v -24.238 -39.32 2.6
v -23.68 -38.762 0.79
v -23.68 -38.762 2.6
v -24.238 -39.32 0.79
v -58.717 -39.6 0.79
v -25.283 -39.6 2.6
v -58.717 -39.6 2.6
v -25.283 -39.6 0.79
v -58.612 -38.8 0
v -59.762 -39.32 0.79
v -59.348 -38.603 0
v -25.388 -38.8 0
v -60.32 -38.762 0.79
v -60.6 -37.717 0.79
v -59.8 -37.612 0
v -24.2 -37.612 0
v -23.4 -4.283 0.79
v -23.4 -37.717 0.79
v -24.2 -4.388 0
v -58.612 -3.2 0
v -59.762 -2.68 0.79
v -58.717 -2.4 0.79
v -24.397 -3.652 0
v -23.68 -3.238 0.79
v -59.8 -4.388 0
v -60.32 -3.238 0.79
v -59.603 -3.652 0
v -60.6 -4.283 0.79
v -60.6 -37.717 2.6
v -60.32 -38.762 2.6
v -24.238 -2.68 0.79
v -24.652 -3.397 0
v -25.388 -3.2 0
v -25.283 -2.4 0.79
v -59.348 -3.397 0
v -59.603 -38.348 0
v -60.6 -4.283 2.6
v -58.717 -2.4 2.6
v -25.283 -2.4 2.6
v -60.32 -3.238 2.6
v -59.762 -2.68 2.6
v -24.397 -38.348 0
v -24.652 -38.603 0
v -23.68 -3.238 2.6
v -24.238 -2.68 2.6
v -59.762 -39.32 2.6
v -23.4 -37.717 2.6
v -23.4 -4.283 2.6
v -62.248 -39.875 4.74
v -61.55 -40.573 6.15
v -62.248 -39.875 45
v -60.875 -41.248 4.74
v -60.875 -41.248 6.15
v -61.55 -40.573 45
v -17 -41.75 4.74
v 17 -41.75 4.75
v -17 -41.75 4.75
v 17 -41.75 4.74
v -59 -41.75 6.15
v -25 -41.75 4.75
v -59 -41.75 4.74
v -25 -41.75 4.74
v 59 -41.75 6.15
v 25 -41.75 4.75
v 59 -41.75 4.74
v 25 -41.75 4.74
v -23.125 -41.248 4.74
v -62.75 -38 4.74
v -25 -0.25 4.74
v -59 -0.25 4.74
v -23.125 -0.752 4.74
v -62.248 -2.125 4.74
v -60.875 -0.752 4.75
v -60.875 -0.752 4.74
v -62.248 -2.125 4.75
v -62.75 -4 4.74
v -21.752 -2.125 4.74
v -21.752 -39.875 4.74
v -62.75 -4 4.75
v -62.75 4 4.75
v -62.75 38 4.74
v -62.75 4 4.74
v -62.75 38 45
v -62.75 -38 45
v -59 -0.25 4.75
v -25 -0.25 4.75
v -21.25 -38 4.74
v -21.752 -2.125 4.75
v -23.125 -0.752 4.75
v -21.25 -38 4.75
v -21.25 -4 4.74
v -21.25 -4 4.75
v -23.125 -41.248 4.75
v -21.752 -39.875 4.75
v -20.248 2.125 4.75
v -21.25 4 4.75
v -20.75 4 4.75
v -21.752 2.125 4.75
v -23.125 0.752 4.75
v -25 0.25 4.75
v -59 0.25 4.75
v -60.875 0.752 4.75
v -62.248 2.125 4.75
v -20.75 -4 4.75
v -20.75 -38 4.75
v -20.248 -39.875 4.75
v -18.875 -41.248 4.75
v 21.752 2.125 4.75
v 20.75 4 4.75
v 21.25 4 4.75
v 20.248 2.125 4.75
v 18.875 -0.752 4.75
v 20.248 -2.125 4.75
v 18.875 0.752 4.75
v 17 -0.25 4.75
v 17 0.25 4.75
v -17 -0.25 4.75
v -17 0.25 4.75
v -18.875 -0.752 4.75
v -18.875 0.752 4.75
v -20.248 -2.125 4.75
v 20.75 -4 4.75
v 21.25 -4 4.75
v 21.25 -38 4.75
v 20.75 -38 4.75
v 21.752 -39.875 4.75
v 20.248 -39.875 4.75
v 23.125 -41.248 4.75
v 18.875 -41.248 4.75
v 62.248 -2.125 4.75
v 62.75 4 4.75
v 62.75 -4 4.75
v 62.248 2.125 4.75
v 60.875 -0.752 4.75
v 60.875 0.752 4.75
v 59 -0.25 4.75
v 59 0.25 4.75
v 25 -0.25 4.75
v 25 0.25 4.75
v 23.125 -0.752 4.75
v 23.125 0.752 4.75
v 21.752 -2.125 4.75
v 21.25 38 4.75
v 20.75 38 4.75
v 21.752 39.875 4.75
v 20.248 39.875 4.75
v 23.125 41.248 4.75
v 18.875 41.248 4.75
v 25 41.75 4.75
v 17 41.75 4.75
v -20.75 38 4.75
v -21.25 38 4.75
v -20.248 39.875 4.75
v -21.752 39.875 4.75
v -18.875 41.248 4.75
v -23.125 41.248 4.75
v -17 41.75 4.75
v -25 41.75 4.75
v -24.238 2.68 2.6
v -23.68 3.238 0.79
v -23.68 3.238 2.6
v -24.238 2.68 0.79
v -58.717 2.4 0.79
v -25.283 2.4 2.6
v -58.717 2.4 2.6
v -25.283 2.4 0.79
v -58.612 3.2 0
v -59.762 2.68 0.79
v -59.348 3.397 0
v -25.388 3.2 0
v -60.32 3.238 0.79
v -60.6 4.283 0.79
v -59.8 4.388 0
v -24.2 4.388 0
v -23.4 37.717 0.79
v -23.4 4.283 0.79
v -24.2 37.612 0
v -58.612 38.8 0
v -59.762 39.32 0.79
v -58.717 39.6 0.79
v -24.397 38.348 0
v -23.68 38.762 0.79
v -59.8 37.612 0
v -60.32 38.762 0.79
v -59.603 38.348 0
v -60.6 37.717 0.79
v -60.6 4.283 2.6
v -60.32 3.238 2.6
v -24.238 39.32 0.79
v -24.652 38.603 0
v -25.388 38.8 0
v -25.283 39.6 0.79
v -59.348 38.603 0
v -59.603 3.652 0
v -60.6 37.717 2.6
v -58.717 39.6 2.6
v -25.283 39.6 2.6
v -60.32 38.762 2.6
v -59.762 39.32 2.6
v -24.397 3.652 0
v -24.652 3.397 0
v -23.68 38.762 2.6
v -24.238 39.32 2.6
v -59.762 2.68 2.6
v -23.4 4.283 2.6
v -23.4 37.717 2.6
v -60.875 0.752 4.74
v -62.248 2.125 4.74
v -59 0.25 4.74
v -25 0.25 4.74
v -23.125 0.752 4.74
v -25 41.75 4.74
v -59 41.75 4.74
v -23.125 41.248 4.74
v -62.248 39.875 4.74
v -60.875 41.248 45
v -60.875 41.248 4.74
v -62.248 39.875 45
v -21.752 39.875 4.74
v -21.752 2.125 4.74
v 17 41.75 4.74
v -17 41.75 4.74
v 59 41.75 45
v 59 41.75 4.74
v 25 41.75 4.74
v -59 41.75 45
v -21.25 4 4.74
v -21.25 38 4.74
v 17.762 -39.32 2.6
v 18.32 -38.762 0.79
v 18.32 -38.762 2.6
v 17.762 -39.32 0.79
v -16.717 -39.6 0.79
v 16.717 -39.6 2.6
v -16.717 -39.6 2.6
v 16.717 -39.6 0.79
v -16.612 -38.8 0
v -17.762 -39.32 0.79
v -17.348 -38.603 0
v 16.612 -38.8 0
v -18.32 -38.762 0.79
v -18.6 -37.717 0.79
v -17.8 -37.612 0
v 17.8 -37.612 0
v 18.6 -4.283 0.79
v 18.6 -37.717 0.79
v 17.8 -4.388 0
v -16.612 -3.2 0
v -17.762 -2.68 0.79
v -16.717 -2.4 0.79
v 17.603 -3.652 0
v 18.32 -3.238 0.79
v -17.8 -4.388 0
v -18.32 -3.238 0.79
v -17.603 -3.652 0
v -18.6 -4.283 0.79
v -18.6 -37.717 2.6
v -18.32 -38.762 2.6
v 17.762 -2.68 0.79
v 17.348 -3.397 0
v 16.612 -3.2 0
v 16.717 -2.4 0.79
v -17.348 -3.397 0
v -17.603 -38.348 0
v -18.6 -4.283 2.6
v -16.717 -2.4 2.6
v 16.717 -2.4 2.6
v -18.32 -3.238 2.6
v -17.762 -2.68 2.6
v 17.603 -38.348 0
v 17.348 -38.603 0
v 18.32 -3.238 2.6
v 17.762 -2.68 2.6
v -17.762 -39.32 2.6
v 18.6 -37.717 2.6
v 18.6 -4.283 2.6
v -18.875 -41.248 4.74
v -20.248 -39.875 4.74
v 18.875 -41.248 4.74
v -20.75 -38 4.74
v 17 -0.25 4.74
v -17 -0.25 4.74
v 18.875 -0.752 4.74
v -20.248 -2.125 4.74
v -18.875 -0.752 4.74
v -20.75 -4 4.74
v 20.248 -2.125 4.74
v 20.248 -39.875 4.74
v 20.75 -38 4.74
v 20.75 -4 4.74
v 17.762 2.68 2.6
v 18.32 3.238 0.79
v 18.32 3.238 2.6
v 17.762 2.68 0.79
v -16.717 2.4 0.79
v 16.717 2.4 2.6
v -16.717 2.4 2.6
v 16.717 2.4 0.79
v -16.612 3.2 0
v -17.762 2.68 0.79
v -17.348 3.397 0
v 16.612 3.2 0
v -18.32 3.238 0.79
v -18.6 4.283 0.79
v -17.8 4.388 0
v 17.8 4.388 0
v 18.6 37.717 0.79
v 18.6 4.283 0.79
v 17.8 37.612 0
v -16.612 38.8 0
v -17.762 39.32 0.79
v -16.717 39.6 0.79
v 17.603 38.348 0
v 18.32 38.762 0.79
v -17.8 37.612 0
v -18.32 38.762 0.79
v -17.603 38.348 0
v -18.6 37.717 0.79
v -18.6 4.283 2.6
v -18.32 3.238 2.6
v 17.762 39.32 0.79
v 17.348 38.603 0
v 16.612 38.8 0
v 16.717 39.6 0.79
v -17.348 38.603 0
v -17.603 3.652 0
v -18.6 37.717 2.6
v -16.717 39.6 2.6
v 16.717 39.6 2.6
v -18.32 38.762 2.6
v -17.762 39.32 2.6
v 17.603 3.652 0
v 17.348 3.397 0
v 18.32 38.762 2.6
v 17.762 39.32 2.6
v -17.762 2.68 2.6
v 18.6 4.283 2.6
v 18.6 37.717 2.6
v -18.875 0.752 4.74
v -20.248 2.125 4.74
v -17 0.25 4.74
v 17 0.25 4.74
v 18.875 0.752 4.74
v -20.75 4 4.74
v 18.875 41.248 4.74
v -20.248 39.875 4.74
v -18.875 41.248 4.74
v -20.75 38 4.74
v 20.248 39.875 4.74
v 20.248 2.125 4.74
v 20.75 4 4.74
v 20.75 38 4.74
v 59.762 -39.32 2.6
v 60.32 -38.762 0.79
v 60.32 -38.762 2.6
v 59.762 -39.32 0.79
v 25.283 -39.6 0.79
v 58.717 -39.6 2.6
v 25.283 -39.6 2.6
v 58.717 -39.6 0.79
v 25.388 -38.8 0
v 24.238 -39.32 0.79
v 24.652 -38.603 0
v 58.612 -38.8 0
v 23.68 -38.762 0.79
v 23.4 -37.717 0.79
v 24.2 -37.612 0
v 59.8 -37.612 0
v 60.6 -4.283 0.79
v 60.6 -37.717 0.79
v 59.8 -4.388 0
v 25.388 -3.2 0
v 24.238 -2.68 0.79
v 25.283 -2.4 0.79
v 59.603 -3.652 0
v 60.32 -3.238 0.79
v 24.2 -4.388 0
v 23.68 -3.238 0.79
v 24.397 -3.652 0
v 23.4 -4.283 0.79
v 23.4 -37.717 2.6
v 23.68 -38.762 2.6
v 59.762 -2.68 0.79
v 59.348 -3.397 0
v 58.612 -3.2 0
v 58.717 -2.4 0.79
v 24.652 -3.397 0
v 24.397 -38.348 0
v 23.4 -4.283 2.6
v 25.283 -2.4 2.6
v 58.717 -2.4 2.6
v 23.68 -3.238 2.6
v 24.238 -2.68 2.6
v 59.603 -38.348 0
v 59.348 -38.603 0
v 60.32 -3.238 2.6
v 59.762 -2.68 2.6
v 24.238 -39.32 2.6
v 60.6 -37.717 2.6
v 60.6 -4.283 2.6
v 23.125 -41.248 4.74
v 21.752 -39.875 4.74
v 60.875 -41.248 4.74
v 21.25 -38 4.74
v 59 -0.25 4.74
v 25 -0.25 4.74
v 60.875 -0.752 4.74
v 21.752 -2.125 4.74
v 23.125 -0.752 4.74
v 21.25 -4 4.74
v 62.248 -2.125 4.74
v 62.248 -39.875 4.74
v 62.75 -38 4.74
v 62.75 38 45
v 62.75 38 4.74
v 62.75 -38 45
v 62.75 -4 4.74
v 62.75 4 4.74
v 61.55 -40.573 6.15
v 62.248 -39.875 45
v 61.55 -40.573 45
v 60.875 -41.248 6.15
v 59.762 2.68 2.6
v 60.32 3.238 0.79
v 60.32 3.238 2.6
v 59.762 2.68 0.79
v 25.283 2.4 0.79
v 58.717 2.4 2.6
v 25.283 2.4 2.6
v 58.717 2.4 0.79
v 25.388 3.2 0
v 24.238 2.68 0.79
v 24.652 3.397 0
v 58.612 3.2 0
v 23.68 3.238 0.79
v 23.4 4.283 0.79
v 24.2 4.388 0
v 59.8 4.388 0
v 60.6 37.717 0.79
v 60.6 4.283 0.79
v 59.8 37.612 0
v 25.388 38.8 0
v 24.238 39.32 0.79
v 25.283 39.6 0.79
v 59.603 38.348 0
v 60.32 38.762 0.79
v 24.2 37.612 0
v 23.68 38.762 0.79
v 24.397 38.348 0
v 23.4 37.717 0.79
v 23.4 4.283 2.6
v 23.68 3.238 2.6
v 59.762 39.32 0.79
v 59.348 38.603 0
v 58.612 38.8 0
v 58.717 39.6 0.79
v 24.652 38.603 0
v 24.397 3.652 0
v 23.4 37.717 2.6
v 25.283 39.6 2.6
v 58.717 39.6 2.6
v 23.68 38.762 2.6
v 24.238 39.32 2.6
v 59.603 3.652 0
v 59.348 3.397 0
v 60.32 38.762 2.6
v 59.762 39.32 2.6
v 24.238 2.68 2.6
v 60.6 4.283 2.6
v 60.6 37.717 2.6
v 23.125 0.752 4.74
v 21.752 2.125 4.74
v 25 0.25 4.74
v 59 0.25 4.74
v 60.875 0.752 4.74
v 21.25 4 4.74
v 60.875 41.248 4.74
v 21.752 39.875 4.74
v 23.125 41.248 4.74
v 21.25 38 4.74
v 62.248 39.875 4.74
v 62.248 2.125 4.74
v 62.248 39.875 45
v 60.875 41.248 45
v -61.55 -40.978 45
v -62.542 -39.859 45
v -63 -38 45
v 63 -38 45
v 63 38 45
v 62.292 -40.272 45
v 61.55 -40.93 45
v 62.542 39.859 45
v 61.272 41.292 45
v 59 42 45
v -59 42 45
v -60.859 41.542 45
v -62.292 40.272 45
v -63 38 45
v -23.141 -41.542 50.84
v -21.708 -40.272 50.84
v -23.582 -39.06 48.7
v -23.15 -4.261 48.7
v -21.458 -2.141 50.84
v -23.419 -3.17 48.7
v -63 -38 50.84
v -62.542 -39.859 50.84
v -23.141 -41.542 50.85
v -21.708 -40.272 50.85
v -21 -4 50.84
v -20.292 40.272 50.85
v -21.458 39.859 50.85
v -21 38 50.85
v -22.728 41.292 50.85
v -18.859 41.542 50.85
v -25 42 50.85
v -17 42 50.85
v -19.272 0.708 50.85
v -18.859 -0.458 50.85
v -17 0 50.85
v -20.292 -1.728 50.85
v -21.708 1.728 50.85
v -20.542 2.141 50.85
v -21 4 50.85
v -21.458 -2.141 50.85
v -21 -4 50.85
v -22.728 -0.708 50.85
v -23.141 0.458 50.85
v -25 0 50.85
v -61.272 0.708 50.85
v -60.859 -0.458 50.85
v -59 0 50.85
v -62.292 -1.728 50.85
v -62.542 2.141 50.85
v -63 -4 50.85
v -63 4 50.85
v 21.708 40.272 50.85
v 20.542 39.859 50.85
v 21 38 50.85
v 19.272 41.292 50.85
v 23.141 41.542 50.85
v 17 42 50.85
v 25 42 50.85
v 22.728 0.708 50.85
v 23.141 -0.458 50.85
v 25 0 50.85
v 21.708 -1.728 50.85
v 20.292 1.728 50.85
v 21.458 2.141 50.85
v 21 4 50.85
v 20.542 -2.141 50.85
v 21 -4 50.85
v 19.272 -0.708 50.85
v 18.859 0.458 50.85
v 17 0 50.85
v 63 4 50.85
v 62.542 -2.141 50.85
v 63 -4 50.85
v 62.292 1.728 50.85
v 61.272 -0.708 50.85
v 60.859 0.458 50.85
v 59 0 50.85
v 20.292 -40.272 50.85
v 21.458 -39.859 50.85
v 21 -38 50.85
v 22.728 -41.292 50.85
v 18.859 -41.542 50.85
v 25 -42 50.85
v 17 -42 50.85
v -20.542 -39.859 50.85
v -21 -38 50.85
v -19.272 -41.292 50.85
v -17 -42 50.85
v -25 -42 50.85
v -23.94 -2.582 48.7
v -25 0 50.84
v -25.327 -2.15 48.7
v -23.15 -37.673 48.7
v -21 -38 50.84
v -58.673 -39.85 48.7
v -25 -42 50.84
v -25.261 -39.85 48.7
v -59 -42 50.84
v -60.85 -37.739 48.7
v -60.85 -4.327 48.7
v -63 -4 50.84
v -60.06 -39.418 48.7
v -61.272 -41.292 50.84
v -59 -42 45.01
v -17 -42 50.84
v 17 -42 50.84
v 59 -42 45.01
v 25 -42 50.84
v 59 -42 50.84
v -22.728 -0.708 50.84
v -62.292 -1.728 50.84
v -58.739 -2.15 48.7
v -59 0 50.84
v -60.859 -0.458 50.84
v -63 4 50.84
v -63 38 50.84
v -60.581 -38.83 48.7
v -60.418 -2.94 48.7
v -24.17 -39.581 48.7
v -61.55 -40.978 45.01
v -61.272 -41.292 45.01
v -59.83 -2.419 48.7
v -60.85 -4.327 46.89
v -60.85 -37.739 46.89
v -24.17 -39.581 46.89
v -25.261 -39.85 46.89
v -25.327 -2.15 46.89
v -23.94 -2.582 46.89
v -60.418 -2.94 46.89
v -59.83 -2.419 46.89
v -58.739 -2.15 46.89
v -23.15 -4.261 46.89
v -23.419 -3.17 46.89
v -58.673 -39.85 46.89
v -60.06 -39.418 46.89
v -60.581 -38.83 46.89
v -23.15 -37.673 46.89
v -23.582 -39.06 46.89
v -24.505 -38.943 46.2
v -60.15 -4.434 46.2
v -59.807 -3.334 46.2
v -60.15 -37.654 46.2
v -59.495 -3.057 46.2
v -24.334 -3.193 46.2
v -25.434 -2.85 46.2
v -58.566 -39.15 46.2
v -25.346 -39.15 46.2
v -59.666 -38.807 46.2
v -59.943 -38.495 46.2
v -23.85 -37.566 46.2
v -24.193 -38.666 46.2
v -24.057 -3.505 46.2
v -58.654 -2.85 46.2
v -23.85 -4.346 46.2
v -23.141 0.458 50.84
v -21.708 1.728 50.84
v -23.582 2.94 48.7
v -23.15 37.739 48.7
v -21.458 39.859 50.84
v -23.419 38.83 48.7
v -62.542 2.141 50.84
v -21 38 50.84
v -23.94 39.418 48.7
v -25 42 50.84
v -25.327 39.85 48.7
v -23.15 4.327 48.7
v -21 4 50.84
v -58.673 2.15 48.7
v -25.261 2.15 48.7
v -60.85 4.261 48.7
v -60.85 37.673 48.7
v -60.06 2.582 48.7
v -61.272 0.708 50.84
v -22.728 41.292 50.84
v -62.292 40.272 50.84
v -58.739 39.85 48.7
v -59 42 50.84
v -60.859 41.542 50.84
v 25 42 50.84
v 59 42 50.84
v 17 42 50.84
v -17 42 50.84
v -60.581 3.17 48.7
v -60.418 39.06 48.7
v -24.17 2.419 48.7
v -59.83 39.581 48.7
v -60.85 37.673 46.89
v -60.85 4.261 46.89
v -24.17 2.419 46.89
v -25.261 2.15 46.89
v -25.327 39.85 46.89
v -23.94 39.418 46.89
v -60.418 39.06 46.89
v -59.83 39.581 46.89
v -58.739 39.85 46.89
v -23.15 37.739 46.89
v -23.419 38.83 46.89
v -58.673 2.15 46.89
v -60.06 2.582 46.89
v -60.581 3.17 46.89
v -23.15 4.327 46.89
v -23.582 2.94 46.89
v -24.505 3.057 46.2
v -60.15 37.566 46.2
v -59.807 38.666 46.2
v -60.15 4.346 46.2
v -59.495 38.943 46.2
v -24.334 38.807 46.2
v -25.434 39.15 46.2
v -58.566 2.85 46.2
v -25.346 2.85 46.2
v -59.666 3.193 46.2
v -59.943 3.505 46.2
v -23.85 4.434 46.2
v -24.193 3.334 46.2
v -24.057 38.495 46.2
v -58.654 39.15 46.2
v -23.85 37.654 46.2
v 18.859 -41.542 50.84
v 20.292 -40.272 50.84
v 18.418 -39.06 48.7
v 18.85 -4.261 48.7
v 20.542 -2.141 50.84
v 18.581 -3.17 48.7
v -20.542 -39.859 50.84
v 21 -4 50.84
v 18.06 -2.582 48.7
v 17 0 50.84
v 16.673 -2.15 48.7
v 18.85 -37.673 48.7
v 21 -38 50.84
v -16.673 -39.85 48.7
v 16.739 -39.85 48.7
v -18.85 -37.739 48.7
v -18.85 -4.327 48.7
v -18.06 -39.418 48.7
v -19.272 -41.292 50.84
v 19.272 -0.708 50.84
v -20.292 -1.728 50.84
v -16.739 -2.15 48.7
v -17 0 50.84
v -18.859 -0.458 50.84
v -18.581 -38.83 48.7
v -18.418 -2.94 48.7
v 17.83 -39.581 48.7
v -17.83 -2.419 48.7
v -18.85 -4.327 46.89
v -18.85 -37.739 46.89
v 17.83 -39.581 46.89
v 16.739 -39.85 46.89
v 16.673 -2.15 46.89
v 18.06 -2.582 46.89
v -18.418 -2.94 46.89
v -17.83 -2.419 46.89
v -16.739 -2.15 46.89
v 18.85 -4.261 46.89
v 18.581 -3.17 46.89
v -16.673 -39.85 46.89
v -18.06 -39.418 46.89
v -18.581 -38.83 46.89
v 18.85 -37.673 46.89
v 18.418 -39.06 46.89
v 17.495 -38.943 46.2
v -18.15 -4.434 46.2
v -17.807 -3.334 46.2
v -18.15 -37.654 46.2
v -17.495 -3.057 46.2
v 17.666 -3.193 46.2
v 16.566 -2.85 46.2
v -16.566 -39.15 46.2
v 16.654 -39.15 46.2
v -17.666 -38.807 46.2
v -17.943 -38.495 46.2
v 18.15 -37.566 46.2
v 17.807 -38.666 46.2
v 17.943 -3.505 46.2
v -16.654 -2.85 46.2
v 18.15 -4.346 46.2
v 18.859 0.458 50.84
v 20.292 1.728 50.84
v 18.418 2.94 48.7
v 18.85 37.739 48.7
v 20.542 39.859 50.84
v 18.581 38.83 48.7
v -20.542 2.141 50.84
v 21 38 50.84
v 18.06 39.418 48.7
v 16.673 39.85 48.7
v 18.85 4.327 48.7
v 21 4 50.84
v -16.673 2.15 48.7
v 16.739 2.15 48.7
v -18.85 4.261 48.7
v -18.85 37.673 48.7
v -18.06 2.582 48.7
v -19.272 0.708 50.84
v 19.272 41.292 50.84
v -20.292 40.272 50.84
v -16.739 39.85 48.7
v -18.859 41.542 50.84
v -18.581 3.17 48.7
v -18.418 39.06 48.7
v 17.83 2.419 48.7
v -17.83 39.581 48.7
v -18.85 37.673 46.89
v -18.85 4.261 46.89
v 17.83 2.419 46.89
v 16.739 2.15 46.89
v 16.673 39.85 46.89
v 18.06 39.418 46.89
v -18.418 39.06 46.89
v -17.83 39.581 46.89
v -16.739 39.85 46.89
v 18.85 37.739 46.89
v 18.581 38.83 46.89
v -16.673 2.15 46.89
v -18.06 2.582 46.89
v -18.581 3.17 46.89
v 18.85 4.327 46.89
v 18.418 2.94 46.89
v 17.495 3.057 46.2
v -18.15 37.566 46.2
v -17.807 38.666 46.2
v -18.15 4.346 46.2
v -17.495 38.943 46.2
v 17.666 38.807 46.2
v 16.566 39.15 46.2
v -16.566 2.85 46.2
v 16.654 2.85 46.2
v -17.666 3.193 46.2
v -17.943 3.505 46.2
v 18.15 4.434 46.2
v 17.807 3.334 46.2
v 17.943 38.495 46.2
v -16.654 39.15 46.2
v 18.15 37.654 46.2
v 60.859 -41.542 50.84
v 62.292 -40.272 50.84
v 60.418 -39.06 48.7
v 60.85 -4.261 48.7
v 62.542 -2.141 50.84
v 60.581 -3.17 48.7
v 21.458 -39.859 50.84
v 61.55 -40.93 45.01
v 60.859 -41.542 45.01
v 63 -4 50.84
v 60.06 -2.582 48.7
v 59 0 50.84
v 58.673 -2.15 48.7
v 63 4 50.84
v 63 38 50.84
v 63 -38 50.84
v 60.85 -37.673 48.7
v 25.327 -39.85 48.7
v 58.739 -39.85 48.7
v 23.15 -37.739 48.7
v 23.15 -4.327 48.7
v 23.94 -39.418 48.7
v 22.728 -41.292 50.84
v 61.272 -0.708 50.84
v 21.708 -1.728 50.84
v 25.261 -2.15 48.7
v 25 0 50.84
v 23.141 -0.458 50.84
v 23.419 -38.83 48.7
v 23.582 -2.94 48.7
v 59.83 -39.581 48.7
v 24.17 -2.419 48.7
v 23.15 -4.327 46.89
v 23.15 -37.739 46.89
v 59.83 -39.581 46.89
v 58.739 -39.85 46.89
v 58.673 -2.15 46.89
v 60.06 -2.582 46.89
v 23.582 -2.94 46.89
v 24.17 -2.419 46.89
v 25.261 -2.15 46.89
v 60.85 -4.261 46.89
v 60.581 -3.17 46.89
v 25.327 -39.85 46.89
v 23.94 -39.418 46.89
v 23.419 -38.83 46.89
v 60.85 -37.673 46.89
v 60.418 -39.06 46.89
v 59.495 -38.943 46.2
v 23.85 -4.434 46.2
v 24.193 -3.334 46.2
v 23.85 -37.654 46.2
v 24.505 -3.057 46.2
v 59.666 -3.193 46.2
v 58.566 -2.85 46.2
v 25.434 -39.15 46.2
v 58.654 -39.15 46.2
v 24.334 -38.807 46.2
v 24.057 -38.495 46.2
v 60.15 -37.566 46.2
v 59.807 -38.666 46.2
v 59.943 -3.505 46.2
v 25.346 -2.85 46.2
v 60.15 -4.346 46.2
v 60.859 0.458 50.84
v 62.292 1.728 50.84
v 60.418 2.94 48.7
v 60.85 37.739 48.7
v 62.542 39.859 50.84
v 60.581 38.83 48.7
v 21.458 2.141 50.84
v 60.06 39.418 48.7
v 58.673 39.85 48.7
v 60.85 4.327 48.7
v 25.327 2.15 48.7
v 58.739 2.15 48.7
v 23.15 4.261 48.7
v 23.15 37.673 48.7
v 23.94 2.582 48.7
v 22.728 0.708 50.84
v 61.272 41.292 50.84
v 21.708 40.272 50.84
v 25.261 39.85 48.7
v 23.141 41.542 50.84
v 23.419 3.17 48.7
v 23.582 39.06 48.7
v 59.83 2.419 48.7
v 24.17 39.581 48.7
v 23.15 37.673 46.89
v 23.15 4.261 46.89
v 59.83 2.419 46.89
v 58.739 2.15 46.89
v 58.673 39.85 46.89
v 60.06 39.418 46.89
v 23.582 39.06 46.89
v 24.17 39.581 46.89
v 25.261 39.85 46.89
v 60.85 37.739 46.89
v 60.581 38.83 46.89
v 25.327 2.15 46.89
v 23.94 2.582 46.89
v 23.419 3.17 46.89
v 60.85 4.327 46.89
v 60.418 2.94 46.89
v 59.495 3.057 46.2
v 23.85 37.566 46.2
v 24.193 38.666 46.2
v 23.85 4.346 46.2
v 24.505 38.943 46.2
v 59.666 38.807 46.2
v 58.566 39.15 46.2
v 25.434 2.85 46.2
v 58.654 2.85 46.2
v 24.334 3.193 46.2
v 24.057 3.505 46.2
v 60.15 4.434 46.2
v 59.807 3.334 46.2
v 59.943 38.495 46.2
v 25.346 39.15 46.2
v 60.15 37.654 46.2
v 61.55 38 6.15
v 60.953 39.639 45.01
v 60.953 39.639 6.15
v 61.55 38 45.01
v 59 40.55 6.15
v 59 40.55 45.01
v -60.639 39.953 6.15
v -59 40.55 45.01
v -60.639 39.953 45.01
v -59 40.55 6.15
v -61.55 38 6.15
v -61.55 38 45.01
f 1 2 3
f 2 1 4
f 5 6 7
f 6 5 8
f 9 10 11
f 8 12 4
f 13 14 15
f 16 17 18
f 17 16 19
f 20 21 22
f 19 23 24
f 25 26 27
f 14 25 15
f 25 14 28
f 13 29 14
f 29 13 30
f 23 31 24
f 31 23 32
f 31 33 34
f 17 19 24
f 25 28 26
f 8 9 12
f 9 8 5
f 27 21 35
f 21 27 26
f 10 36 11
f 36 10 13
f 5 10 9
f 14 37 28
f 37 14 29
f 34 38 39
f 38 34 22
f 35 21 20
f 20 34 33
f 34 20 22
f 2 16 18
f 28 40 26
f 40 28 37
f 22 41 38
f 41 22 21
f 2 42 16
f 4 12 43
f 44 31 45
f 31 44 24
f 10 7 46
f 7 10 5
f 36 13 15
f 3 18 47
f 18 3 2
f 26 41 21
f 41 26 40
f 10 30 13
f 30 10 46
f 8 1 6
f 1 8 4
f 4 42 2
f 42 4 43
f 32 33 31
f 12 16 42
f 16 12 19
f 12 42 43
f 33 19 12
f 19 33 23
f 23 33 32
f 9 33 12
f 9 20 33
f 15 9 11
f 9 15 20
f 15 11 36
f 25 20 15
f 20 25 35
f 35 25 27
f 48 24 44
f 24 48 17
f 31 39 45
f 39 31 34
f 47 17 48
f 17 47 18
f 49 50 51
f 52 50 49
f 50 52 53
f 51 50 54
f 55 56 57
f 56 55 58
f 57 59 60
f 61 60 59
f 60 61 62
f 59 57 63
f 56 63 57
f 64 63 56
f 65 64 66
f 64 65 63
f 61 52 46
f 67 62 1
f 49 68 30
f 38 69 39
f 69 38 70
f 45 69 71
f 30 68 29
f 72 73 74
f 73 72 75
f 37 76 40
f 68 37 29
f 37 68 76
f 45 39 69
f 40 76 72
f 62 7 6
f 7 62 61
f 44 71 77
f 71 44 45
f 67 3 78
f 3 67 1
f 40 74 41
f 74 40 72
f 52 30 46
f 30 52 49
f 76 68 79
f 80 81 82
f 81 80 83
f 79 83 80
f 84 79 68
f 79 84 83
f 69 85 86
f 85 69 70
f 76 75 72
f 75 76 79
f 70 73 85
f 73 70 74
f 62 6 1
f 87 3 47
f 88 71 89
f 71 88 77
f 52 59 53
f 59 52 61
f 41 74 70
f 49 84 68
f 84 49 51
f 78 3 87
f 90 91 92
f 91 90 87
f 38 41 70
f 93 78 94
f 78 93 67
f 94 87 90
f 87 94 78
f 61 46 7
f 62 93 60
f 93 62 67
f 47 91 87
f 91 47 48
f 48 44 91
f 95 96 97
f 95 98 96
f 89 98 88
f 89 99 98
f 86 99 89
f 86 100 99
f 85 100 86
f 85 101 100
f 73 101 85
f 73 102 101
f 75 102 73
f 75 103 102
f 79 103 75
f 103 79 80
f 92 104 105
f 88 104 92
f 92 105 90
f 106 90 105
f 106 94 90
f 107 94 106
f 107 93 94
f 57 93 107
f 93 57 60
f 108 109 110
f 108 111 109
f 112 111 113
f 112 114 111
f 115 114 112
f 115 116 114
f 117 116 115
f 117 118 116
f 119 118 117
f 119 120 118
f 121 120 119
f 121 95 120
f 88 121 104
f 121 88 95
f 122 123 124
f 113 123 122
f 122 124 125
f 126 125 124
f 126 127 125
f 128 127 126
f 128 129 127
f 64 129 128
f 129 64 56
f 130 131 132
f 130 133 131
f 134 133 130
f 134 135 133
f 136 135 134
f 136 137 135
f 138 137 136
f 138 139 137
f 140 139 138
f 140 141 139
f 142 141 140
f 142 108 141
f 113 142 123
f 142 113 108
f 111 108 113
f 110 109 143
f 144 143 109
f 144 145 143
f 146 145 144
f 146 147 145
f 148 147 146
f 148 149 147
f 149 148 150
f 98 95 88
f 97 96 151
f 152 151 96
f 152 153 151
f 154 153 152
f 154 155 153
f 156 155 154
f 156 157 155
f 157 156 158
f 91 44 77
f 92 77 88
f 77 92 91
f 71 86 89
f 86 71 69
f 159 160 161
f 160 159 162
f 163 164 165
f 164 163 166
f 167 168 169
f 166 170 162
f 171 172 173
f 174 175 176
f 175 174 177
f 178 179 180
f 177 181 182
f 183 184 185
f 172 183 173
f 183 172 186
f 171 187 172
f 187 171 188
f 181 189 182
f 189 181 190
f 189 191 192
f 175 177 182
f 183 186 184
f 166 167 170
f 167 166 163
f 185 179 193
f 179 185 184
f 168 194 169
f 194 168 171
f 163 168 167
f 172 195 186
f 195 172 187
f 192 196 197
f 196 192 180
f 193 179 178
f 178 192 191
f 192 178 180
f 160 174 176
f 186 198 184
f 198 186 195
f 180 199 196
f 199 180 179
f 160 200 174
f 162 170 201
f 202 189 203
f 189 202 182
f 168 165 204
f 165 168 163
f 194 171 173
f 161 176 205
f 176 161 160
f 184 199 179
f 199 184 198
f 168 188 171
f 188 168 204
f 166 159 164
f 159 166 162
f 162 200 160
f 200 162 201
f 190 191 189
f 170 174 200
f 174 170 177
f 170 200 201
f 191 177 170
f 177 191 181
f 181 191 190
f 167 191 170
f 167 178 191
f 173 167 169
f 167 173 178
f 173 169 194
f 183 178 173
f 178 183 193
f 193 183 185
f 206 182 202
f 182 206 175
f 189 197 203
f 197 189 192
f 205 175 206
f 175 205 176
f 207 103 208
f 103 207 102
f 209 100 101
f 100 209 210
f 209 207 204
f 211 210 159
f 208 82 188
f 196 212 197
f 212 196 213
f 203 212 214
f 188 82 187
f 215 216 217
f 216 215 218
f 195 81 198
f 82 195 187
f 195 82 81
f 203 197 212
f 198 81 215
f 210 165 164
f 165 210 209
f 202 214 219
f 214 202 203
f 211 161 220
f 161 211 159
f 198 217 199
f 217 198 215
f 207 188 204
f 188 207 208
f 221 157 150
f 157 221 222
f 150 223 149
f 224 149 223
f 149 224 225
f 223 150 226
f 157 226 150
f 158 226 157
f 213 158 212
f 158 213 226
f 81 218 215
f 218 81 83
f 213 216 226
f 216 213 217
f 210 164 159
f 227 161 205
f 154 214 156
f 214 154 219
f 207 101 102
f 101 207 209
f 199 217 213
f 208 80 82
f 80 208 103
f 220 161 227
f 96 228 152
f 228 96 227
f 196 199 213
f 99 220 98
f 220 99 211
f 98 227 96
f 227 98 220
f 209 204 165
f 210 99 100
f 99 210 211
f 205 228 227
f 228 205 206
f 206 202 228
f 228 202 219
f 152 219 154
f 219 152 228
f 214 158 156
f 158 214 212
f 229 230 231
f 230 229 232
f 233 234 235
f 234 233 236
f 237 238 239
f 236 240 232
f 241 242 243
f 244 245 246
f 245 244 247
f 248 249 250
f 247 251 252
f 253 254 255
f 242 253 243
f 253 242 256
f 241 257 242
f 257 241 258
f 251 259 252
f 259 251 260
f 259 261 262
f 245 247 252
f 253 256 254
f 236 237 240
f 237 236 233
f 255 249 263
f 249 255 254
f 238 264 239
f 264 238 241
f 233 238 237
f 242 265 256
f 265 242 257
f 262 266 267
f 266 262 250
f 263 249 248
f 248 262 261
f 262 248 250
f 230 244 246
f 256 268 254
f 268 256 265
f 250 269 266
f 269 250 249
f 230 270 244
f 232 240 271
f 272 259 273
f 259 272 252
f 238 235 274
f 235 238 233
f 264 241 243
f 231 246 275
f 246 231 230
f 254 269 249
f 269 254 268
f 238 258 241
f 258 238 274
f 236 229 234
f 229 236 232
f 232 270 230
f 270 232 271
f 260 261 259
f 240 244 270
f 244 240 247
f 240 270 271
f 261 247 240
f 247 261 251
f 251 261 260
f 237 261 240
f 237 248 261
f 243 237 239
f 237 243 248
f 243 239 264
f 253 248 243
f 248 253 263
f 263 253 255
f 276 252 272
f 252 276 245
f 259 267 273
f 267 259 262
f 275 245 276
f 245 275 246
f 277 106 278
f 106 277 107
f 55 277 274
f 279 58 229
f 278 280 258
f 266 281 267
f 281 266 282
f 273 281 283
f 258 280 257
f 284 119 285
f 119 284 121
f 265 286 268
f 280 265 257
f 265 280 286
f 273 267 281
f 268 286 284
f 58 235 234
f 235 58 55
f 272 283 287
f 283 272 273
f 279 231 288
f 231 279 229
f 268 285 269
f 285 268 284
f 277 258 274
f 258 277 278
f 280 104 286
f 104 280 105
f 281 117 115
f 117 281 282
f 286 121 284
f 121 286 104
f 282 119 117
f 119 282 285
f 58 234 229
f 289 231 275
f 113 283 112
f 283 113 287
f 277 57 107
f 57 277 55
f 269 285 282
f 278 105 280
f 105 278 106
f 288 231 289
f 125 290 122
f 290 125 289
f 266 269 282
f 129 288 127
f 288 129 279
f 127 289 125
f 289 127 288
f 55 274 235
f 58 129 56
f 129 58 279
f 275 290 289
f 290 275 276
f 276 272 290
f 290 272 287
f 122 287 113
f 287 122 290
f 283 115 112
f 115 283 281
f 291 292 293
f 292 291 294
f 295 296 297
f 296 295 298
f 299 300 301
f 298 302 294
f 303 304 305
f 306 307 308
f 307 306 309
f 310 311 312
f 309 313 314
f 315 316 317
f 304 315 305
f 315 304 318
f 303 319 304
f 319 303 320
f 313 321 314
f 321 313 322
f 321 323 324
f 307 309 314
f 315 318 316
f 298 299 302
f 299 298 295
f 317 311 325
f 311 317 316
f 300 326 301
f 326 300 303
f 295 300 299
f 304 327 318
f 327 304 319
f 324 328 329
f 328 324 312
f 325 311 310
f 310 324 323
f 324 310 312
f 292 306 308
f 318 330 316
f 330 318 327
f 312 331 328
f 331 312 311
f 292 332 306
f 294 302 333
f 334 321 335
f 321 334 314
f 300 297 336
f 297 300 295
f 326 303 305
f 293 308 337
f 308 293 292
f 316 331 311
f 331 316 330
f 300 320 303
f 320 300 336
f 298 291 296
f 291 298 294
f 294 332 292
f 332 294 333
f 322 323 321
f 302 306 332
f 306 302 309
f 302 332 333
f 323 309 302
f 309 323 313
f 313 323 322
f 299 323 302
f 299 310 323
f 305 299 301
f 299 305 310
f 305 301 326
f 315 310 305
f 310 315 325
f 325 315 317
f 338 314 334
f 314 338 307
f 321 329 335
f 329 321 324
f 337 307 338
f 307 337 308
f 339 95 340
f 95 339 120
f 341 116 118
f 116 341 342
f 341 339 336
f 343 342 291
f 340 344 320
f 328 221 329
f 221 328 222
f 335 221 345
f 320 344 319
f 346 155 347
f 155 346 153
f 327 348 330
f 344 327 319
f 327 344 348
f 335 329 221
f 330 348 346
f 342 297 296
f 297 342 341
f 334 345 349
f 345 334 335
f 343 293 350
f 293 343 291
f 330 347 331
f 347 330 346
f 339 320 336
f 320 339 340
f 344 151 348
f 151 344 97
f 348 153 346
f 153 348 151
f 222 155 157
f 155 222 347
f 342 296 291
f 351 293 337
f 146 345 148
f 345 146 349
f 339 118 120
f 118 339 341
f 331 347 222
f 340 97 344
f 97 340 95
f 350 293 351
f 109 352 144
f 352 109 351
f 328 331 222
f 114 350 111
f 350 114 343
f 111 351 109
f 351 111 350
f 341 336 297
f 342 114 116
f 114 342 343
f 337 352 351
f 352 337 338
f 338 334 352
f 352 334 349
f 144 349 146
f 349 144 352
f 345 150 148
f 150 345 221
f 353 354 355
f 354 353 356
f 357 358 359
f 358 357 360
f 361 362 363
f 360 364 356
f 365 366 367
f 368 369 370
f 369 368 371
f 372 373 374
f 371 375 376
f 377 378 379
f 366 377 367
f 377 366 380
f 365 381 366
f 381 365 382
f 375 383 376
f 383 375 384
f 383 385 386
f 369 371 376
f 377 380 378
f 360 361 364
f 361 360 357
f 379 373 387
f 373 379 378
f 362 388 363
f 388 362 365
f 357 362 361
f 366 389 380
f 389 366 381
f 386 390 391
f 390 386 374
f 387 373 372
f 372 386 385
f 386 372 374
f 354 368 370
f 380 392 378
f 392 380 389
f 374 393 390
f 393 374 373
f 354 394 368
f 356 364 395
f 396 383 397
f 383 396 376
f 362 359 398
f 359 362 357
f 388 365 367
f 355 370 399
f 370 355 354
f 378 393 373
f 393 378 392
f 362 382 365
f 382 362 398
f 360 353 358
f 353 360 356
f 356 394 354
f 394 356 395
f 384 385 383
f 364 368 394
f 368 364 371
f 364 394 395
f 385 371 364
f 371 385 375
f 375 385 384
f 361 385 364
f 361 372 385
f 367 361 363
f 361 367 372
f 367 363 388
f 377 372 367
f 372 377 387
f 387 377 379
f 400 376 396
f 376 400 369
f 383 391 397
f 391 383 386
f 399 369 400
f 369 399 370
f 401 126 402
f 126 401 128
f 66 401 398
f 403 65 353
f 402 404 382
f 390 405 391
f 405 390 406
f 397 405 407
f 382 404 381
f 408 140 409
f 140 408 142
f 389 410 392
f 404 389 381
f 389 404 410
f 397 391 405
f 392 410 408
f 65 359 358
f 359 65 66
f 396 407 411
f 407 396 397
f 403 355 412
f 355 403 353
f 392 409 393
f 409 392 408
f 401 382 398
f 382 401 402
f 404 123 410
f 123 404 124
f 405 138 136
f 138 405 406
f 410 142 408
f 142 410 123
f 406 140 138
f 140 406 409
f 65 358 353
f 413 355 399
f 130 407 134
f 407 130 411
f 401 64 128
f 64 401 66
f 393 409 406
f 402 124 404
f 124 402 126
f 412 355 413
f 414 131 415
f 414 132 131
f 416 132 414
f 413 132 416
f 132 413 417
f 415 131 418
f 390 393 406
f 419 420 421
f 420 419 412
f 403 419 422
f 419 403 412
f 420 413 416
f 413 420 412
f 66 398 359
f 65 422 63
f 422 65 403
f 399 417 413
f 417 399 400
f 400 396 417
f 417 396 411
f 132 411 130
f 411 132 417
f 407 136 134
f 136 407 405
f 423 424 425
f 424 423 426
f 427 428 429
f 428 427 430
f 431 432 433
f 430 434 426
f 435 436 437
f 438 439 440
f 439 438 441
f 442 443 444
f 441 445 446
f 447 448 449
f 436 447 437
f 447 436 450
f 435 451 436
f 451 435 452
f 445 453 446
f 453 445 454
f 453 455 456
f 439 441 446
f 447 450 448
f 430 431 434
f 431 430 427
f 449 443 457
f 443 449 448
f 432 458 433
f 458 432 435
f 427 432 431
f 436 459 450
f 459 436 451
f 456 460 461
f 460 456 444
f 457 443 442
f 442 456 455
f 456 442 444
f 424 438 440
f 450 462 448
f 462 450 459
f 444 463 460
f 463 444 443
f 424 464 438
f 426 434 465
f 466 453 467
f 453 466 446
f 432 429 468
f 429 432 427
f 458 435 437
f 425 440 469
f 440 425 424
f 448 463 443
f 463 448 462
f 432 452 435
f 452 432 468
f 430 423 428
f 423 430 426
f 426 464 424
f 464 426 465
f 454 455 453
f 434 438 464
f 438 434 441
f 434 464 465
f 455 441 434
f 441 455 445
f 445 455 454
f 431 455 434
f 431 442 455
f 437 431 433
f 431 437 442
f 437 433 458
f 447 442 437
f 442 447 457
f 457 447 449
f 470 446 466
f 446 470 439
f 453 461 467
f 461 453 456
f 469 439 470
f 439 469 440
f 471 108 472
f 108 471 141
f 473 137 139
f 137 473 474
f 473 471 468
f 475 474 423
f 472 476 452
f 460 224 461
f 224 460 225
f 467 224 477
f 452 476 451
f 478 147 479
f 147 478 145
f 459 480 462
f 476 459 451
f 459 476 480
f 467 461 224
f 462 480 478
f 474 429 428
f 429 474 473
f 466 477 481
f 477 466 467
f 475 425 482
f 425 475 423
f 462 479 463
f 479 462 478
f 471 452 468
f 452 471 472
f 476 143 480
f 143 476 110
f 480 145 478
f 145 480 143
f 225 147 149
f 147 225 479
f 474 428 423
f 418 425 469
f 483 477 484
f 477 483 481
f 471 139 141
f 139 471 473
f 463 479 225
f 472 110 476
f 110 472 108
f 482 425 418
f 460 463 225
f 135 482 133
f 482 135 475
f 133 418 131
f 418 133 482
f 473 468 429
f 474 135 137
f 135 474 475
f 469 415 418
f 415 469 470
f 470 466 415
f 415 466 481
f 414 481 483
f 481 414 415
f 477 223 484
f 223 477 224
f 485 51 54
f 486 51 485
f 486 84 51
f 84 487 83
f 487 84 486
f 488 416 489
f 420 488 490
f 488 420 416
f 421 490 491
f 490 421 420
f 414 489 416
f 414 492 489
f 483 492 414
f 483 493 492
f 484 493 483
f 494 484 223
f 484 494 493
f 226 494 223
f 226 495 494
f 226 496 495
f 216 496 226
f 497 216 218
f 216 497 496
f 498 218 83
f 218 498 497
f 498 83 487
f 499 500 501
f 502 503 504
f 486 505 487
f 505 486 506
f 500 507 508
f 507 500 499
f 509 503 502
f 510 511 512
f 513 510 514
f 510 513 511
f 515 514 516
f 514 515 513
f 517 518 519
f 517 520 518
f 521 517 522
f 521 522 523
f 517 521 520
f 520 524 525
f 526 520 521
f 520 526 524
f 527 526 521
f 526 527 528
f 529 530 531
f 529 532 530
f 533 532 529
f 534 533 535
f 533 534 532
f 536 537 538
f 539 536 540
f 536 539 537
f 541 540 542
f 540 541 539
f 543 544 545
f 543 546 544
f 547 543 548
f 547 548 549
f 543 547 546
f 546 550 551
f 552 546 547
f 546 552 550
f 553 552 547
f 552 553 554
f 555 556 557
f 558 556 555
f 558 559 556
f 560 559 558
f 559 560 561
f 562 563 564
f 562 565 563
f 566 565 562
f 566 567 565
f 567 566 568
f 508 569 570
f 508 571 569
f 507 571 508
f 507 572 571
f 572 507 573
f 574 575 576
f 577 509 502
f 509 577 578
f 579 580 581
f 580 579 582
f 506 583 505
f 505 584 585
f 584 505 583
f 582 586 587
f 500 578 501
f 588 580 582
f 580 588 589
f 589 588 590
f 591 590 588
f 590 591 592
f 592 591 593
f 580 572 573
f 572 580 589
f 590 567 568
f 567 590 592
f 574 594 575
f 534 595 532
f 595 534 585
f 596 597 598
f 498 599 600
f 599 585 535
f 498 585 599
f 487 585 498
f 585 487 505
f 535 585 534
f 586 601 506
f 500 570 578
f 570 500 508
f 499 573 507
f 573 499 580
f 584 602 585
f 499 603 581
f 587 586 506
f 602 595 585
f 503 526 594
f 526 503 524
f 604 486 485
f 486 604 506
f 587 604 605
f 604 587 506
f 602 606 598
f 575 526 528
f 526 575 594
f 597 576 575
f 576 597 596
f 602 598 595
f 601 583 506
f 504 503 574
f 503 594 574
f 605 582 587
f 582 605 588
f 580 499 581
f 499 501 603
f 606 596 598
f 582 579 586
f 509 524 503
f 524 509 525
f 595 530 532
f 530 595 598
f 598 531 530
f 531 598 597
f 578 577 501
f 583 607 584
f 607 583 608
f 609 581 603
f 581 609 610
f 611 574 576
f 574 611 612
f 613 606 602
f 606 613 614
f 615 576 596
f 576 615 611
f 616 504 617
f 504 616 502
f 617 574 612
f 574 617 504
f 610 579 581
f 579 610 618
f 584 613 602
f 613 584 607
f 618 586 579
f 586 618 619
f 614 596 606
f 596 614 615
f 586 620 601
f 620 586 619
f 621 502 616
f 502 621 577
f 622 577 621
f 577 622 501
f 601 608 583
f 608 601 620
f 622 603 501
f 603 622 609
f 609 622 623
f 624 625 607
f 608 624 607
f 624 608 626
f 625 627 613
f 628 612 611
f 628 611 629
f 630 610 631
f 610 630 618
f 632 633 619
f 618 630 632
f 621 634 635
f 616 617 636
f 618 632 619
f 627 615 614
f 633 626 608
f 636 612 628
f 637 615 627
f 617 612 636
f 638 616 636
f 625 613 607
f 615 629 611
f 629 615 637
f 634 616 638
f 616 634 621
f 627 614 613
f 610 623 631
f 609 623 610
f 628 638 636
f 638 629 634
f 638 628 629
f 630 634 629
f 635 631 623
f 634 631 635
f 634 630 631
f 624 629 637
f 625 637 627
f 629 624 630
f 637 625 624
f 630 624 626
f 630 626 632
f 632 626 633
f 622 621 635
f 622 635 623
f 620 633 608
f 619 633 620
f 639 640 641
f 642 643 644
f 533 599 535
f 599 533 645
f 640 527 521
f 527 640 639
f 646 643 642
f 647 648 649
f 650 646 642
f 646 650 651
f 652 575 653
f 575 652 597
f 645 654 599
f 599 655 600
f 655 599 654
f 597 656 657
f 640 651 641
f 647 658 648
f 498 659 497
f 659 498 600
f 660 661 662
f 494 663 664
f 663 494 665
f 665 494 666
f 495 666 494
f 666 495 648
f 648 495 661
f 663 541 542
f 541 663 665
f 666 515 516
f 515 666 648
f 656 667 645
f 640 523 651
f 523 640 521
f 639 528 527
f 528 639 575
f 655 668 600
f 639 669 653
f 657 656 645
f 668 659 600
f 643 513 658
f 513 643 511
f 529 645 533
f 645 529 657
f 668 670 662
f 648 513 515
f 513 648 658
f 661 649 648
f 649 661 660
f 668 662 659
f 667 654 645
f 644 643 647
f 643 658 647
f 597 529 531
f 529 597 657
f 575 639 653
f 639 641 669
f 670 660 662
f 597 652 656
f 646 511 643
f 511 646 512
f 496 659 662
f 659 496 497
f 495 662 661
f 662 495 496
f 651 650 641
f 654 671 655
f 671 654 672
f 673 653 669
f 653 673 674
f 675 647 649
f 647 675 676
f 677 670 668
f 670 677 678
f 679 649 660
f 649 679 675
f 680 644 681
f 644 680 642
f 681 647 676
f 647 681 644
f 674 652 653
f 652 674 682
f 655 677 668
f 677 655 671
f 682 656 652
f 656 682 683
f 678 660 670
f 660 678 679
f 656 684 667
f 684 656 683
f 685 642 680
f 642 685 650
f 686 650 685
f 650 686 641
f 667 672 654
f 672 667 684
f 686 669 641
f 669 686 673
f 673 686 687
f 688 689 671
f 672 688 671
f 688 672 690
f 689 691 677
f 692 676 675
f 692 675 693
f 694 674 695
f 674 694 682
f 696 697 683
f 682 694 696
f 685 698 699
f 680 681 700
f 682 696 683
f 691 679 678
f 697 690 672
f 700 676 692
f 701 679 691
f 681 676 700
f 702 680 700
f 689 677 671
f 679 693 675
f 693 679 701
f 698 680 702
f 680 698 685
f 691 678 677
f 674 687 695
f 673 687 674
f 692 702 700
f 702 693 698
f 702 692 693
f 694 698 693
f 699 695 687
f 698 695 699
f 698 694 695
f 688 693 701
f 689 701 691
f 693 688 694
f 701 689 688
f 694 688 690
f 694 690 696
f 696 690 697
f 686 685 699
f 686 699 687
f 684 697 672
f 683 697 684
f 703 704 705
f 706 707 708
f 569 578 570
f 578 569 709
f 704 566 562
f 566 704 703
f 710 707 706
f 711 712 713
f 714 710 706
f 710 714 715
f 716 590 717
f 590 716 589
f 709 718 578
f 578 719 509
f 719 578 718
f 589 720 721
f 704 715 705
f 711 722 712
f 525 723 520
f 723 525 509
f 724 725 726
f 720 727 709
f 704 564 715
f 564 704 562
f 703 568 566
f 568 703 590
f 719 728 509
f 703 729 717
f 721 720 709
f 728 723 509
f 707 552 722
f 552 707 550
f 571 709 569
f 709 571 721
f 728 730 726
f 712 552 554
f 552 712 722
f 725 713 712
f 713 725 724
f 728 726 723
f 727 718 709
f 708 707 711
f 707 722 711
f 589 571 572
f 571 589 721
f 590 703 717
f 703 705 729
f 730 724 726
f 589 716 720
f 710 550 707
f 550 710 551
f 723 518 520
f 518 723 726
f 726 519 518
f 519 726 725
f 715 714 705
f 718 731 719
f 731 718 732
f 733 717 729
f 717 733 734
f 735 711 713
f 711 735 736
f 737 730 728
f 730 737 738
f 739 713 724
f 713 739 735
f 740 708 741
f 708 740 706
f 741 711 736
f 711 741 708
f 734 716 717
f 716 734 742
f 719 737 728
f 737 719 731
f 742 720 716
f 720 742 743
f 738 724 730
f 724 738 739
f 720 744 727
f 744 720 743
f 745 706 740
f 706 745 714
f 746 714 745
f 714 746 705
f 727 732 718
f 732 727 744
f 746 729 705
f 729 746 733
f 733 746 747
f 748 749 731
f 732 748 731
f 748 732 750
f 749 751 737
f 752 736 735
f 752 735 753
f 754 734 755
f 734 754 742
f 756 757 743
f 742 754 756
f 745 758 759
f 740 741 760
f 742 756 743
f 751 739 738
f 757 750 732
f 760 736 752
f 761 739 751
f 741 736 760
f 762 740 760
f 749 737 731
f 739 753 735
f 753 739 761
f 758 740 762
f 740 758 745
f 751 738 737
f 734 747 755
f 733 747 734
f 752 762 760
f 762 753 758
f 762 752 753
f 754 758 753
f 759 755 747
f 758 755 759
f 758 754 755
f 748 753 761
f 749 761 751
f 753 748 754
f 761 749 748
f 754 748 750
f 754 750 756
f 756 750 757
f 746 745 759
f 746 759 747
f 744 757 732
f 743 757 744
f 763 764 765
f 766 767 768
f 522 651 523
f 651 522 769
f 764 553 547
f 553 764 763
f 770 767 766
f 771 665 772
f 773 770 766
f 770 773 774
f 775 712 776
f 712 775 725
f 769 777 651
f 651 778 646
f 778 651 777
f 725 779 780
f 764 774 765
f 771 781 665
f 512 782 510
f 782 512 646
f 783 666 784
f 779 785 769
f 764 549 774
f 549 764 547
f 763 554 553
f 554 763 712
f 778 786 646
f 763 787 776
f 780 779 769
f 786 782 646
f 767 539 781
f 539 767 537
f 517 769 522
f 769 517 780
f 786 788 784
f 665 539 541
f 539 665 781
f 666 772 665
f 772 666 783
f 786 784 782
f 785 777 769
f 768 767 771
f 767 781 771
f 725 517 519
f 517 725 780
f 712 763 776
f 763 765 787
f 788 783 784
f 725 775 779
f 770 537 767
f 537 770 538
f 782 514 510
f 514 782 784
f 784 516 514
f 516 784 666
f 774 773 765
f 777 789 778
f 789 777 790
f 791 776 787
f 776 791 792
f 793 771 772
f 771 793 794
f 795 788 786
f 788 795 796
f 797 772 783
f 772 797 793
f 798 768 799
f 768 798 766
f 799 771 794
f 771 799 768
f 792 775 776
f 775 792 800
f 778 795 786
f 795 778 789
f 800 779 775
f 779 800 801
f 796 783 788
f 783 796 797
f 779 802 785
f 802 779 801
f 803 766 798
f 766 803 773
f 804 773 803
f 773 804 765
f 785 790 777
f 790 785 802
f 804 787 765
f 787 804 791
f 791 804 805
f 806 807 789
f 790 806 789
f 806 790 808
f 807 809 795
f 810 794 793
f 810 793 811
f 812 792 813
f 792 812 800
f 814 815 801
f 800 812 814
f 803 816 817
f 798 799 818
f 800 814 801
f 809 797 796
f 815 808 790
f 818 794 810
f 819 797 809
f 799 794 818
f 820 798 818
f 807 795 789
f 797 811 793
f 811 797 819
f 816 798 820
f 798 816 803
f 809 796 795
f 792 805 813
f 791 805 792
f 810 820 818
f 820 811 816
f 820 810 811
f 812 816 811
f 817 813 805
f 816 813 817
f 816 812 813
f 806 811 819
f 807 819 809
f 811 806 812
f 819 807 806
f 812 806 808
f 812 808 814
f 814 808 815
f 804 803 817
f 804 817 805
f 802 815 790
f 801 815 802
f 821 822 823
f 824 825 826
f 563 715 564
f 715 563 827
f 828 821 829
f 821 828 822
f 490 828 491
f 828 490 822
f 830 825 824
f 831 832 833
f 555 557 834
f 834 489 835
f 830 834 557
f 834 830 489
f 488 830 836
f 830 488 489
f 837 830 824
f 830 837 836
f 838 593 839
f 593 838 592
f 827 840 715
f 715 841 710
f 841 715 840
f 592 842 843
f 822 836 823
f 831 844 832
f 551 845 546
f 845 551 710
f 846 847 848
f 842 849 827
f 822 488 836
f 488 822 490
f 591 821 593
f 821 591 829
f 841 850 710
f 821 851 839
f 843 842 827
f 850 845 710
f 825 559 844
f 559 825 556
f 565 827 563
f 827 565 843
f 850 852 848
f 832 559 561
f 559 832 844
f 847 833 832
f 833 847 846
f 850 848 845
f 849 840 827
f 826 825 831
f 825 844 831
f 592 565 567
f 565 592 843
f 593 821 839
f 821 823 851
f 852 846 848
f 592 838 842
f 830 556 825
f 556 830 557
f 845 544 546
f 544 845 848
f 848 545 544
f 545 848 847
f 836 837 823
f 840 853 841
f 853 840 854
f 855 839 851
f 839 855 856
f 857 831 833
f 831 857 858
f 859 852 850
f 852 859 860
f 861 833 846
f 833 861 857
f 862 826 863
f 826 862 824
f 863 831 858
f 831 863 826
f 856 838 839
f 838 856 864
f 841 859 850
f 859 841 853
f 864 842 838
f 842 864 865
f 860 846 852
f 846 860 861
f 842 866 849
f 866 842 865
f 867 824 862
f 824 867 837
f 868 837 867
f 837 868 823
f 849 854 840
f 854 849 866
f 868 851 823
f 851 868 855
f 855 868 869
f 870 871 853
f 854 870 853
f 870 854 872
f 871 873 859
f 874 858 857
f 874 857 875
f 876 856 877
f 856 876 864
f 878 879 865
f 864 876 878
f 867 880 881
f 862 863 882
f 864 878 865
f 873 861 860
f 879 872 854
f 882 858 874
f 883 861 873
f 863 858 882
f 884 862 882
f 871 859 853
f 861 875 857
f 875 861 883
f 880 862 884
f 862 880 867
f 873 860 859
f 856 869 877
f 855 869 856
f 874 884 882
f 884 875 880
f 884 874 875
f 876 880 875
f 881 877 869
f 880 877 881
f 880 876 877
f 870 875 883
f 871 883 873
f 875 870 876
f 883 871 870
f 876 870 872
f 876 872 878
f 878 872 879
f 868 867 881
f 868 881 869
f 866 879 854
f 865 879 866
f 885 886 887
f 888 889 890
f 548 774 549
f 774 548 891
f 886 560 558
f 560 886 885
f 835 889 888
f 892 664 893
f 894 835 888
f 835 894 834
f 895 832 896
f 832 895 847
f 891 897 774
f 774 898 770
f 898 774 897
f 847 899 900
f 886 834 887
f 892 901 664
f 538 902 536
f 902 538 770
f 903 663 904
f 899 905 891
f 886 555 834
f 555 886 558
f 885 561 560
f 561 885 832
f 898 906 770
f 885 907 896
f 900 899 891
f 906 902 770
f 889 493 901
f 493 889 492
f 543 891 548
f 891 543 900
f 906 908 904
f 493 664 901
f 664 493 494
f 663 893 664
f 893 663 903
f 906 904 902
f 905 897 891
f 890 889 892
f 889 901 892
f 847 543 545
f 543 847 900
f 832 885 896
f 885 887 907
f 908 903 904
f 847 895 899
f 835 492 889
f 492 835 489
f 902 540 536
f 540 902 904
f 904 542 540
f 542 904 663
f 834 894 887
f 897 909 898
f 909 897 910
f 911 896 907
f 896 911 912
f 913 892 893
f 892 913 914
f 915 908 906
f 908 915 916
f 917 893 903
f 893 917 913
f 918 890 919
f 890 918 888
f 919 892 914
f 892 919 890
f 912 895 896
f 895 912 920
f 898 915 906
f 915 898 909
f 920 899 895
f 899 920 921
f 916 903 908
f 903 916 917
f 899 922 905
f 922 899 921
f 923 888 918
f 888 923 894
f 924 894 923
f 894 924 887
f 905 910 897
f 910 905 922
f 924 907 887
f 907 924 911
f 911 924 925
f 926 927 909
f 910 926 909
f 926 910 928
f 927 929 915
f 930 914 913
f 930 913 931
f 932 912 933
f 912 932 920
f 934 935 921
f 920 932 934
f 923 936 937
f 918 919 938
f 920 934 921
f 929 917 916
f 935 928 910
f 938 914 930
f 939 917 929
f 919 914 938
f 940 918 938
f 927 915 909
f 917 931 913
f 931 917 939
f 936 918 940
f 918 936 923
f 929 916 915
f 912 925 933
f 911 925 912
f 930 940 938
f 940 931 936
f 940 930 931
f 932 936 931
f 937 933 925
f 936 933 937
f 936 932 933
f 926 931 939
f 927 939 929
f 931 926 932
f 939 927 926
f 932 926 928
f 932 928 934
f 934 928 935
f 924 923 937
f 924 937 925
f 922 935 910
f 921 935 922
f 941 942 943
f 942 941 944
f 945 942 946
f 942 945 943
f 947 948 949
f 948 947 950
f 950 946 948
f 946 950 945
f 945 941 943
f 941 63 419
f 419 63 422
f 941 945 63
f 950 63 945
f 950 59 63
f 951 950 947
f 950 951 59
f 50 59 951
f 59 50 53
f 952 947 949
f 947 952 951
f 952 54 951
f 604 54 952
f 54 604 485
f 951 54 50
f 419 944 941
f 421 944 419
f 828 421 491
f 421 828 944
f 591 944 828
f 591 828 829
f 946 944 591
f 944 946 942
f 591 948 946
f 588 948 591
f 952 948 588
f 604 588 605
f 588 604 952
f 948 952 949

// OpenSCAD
// file: ../lib/vessel.scad
// SPDX-License-Identifier: MIT
// Copyright (c) 2026 Aaron Cupp
//
// vessel.scad — parametric collar cups for bottles, cans, and pen-form tools.
//
// A collar cup is a solid Gridfinity block with cylindrical bores sunk into it.
// It LOCATES a vessel; it does not clamp one. That distinction is the whole
// design: a collar that grips harder than the bin weighs comes out of the
// baseplate with the bottle when you grab it one-handed. Clearance, not
// interference — CLR is per-diameter, not per-side.
//
// Capture depth is roughly a third of the vessel's height. Enough to resist a
// knock (this bench sits under a 180 W fume-extractor intake), not so much that
// you're fishing the bottle out.
//
//   collar_cup(nx, ny, vessel_d, capture_h, …)   — one centred bore
//   collar_cup_multi(nx, ny, bores, capture_h, …) — bores = [[x, y, d], …]
//
// Cord slot: pen-form tools that stand in a cup are usually corded (the HARDELL
// rotary tool takes a barrel jack). Without a slot the lead drapes over the rim
// and levers the tool sideways. `cord_w > 0` cuts a channel from the bore out
// through the wall, open to the top.

include <gridfinity.scad>

CLR      = 1.0;   // bore = vessel_d + CLR. Loose on purpose — see above.
MIN_WALL = 1.2;   // minimum material between two bores, and bore to outer face

// ---- geometry guards ----
// Overlapping bores and bores that break out through the side wall both still
// render as perfectly watertight, 2-manifold meshes — CI cannot tell you the
// part is wrong, only that it is closed. These asserts encode the intent that
// the mesh check can't. Cheap, and they fire at render time rather than on the
// printer.
function _pair_gaps(bores, clr) = [
    for (i = [0 : len(bores)-1], j = [0 : len(bores)-1]) if (i < j)
        norm([bores[i][0]-bores[j][0], bores[i][1]-bores[j][1]])
        - (bores[i][2]+clr)/2 - (bores[j][2]+clr)/2
];
function _edge_gaps(bores, clr, W, D) = [
    for (b = bores) min(W/2 - abs(b[0]) - (b[2]+clr)/2,
                        D/2 - abs(b[1]) - (b[2]+clr)/2)
];

// Multi-bore block. Bores are [x, y, diameter] in mm, relative to the block centre.
module collar_cup_multi(nx, ny, bores, capture_h, floor = 1.4, clr = CLR,
                        cord_w = 0, cord_at = 0, min_wall = MIN_WALL) {
    h = BIN_BASE_H + floor + capture_h;
    e = 0.1;
    W = nx*GF - 0.5; D = ny*GF - 0.5;
    _pg = _pair_gaps(bores, clr);
    _eg = _edge_gaps(bores, clr, W, D);
    assert(len(_pg) == 0 || min(_pg) >= min_wall,
           "collar_cup: bores are too close — they would merge into one pocket");
    assert(min(_eg) >= min_wall,
           "collar_cup: a bore breaches the outer wall — block needs more units");
    difference() {
        bin_blank(nx, ny, h);
        for (b = bores)
            translate([b[0], b[1], BIN_BASE_H + floor])
                cylinder(d = b[2] + clr, h = capture_h + e, $fn = 96);
        // Cord channel: from the first bore outward through the +X wall, open to
        // the rim so the lead drops in from above rather than threading.
        if (cord_w > 0)
            translate([bores[0][0], bores[0][1] - cord_w/2, BIN_BASE_H + floor + cord_at])
                cube([nx*GF, cord_w, h]);
    }
}

// Single centred bore — the common case.
module collar_cup(nx, ny, vessel_d, capture_h, floor = 1.4, clr = CLR,
                  cord_w = 0, cord_at = 0, min_wall = MIN_WALL) {
    collar_cup_multi(nx, ny, [[0, 0, vessel_d]], capture_h, floor, clr,
                     cord_w, cord_at, min_wall);
}

// Evenly spaced row of same-depth bores along X — for a rank of aerosol cans.
// Returns geometry, not a list; pass the diameters and it lays them out on the
// block's centre line.
module collar_cup_row(nx, ny, diameters, capture_h, floor = 1.4, clr = CLR,
                      min_wall = MIN_WALL) {
    n = len(diameters);
    pitch = nx * GF / n;
    collar_cup_multi(nx, ny,
        [for (i = [0 : n-1]) [(i - (n-1)/2) * pitch, 0, diameters[i]]],
        capture_h, floor, clr, 0, 0, min_wall);
}
// file: cleaning_station_common.scad
// cleaning_station_common.scad — shared parameters for the bench cleaning station.
//
// The IPA / contact-cleaner corner of the electronics repair bench. Everything
// here is measured off the actual items with calipers; nothing is a nominal from
// a product page. Diameters carry a per-diameter clearance (lib/vessel.scad CLR),
// not per-side.
//
// This corner sits under a fume-extractor intake, which drives two decisions:
//   * Cups CAPTURE the vessel rather than clamp it — a collar that grips harder
//     than the bin weighs lifts out of the baseplate with the bottle.
//   * Bins stay as low as the job allows. Capture velocity is decided in the
//     first six inches, and a wall of tall bins in front of the hood costs it.
//
// The aerosols are FLAMMABLE and this bench has a 400 °C iron on it. These cups
// are for working cans only; bulk stock belongs away from the hood entirely.

include <../lib/vessel.scad>

// ---- measured diameters (mm) ----
D_FREEZE_SPRAY = 56.00;   // MEICON freeze spray
D_DEOXIT_D5    = 54.20;   // DeoxIT D5 contact cleaner
D_DEOXIT_F5    = 51.75;   // DeoxIT F5 FaderLube
D_DISPENSER    = 53.50;   // 200 ml push-down alcohol pump, square base across flats
D_FLOOD_BOTTLE = 75.50;   // Labvida 500 ml LDPE wash bottle

// ---- melamine sponges (mm) — 3.94 × 2.35 × 0.79 in ----
SPONGE_L = 100.1; SPONGE_W = 59.7; SPONGE_T = 20.1;

// ---- capture depth ----
// Vessel HEIGHTS were not measured, so this is a judgement call rather than a
// derived third-of-height: 50 mm resists a knock without making the bottles a
// two-handed retrieval. One number to change if the first print feels wrong.
CAPTURE = 50;

// Sponge bin: sponges stand ON EDGE (60 mm tall), ~4 across the 81 mm interior.
// On edge beats flat-stacked — same count in a 68 mm bin instead of a 107 mm one,
// and any sponge can be pinched out rather than peeling off the top of a pile.
SPONGE_BIN_H = SPONGE_W + BIN_BASE_H + 1.4 + 2;   // ≈ 68
// main file
// base_swabs — 3×2 stacking base for cotton buds / beauty swabs, with an open
// front so they roll out rather than being fished for.
//
// Its TOP is a Gridfinity baseplate, so bin_sponges socket-stacks straight onto
// it: swabs underneath, sponges above, one footprint on the grid instead of two.
//
// 3×2 rather than the 2×2 a swab bin would need on its own — the footprint has
// to match what stacks on top, and a 100.1 mm sponge does not fit a 2×2's 81 mm
// interior. See bin_sponges.
//
// PRINT: as emitted, feet down. No supports — the open front is swept into the
// pocket profile, so there is no overhang to bridge.
include <cleaning_station_common.scad>

SWAB_BASE_H = 45;   // [25:1:80] height of the swab compartment

stack_base(3, 2, SWAB_BASE_H, open_front = true);
